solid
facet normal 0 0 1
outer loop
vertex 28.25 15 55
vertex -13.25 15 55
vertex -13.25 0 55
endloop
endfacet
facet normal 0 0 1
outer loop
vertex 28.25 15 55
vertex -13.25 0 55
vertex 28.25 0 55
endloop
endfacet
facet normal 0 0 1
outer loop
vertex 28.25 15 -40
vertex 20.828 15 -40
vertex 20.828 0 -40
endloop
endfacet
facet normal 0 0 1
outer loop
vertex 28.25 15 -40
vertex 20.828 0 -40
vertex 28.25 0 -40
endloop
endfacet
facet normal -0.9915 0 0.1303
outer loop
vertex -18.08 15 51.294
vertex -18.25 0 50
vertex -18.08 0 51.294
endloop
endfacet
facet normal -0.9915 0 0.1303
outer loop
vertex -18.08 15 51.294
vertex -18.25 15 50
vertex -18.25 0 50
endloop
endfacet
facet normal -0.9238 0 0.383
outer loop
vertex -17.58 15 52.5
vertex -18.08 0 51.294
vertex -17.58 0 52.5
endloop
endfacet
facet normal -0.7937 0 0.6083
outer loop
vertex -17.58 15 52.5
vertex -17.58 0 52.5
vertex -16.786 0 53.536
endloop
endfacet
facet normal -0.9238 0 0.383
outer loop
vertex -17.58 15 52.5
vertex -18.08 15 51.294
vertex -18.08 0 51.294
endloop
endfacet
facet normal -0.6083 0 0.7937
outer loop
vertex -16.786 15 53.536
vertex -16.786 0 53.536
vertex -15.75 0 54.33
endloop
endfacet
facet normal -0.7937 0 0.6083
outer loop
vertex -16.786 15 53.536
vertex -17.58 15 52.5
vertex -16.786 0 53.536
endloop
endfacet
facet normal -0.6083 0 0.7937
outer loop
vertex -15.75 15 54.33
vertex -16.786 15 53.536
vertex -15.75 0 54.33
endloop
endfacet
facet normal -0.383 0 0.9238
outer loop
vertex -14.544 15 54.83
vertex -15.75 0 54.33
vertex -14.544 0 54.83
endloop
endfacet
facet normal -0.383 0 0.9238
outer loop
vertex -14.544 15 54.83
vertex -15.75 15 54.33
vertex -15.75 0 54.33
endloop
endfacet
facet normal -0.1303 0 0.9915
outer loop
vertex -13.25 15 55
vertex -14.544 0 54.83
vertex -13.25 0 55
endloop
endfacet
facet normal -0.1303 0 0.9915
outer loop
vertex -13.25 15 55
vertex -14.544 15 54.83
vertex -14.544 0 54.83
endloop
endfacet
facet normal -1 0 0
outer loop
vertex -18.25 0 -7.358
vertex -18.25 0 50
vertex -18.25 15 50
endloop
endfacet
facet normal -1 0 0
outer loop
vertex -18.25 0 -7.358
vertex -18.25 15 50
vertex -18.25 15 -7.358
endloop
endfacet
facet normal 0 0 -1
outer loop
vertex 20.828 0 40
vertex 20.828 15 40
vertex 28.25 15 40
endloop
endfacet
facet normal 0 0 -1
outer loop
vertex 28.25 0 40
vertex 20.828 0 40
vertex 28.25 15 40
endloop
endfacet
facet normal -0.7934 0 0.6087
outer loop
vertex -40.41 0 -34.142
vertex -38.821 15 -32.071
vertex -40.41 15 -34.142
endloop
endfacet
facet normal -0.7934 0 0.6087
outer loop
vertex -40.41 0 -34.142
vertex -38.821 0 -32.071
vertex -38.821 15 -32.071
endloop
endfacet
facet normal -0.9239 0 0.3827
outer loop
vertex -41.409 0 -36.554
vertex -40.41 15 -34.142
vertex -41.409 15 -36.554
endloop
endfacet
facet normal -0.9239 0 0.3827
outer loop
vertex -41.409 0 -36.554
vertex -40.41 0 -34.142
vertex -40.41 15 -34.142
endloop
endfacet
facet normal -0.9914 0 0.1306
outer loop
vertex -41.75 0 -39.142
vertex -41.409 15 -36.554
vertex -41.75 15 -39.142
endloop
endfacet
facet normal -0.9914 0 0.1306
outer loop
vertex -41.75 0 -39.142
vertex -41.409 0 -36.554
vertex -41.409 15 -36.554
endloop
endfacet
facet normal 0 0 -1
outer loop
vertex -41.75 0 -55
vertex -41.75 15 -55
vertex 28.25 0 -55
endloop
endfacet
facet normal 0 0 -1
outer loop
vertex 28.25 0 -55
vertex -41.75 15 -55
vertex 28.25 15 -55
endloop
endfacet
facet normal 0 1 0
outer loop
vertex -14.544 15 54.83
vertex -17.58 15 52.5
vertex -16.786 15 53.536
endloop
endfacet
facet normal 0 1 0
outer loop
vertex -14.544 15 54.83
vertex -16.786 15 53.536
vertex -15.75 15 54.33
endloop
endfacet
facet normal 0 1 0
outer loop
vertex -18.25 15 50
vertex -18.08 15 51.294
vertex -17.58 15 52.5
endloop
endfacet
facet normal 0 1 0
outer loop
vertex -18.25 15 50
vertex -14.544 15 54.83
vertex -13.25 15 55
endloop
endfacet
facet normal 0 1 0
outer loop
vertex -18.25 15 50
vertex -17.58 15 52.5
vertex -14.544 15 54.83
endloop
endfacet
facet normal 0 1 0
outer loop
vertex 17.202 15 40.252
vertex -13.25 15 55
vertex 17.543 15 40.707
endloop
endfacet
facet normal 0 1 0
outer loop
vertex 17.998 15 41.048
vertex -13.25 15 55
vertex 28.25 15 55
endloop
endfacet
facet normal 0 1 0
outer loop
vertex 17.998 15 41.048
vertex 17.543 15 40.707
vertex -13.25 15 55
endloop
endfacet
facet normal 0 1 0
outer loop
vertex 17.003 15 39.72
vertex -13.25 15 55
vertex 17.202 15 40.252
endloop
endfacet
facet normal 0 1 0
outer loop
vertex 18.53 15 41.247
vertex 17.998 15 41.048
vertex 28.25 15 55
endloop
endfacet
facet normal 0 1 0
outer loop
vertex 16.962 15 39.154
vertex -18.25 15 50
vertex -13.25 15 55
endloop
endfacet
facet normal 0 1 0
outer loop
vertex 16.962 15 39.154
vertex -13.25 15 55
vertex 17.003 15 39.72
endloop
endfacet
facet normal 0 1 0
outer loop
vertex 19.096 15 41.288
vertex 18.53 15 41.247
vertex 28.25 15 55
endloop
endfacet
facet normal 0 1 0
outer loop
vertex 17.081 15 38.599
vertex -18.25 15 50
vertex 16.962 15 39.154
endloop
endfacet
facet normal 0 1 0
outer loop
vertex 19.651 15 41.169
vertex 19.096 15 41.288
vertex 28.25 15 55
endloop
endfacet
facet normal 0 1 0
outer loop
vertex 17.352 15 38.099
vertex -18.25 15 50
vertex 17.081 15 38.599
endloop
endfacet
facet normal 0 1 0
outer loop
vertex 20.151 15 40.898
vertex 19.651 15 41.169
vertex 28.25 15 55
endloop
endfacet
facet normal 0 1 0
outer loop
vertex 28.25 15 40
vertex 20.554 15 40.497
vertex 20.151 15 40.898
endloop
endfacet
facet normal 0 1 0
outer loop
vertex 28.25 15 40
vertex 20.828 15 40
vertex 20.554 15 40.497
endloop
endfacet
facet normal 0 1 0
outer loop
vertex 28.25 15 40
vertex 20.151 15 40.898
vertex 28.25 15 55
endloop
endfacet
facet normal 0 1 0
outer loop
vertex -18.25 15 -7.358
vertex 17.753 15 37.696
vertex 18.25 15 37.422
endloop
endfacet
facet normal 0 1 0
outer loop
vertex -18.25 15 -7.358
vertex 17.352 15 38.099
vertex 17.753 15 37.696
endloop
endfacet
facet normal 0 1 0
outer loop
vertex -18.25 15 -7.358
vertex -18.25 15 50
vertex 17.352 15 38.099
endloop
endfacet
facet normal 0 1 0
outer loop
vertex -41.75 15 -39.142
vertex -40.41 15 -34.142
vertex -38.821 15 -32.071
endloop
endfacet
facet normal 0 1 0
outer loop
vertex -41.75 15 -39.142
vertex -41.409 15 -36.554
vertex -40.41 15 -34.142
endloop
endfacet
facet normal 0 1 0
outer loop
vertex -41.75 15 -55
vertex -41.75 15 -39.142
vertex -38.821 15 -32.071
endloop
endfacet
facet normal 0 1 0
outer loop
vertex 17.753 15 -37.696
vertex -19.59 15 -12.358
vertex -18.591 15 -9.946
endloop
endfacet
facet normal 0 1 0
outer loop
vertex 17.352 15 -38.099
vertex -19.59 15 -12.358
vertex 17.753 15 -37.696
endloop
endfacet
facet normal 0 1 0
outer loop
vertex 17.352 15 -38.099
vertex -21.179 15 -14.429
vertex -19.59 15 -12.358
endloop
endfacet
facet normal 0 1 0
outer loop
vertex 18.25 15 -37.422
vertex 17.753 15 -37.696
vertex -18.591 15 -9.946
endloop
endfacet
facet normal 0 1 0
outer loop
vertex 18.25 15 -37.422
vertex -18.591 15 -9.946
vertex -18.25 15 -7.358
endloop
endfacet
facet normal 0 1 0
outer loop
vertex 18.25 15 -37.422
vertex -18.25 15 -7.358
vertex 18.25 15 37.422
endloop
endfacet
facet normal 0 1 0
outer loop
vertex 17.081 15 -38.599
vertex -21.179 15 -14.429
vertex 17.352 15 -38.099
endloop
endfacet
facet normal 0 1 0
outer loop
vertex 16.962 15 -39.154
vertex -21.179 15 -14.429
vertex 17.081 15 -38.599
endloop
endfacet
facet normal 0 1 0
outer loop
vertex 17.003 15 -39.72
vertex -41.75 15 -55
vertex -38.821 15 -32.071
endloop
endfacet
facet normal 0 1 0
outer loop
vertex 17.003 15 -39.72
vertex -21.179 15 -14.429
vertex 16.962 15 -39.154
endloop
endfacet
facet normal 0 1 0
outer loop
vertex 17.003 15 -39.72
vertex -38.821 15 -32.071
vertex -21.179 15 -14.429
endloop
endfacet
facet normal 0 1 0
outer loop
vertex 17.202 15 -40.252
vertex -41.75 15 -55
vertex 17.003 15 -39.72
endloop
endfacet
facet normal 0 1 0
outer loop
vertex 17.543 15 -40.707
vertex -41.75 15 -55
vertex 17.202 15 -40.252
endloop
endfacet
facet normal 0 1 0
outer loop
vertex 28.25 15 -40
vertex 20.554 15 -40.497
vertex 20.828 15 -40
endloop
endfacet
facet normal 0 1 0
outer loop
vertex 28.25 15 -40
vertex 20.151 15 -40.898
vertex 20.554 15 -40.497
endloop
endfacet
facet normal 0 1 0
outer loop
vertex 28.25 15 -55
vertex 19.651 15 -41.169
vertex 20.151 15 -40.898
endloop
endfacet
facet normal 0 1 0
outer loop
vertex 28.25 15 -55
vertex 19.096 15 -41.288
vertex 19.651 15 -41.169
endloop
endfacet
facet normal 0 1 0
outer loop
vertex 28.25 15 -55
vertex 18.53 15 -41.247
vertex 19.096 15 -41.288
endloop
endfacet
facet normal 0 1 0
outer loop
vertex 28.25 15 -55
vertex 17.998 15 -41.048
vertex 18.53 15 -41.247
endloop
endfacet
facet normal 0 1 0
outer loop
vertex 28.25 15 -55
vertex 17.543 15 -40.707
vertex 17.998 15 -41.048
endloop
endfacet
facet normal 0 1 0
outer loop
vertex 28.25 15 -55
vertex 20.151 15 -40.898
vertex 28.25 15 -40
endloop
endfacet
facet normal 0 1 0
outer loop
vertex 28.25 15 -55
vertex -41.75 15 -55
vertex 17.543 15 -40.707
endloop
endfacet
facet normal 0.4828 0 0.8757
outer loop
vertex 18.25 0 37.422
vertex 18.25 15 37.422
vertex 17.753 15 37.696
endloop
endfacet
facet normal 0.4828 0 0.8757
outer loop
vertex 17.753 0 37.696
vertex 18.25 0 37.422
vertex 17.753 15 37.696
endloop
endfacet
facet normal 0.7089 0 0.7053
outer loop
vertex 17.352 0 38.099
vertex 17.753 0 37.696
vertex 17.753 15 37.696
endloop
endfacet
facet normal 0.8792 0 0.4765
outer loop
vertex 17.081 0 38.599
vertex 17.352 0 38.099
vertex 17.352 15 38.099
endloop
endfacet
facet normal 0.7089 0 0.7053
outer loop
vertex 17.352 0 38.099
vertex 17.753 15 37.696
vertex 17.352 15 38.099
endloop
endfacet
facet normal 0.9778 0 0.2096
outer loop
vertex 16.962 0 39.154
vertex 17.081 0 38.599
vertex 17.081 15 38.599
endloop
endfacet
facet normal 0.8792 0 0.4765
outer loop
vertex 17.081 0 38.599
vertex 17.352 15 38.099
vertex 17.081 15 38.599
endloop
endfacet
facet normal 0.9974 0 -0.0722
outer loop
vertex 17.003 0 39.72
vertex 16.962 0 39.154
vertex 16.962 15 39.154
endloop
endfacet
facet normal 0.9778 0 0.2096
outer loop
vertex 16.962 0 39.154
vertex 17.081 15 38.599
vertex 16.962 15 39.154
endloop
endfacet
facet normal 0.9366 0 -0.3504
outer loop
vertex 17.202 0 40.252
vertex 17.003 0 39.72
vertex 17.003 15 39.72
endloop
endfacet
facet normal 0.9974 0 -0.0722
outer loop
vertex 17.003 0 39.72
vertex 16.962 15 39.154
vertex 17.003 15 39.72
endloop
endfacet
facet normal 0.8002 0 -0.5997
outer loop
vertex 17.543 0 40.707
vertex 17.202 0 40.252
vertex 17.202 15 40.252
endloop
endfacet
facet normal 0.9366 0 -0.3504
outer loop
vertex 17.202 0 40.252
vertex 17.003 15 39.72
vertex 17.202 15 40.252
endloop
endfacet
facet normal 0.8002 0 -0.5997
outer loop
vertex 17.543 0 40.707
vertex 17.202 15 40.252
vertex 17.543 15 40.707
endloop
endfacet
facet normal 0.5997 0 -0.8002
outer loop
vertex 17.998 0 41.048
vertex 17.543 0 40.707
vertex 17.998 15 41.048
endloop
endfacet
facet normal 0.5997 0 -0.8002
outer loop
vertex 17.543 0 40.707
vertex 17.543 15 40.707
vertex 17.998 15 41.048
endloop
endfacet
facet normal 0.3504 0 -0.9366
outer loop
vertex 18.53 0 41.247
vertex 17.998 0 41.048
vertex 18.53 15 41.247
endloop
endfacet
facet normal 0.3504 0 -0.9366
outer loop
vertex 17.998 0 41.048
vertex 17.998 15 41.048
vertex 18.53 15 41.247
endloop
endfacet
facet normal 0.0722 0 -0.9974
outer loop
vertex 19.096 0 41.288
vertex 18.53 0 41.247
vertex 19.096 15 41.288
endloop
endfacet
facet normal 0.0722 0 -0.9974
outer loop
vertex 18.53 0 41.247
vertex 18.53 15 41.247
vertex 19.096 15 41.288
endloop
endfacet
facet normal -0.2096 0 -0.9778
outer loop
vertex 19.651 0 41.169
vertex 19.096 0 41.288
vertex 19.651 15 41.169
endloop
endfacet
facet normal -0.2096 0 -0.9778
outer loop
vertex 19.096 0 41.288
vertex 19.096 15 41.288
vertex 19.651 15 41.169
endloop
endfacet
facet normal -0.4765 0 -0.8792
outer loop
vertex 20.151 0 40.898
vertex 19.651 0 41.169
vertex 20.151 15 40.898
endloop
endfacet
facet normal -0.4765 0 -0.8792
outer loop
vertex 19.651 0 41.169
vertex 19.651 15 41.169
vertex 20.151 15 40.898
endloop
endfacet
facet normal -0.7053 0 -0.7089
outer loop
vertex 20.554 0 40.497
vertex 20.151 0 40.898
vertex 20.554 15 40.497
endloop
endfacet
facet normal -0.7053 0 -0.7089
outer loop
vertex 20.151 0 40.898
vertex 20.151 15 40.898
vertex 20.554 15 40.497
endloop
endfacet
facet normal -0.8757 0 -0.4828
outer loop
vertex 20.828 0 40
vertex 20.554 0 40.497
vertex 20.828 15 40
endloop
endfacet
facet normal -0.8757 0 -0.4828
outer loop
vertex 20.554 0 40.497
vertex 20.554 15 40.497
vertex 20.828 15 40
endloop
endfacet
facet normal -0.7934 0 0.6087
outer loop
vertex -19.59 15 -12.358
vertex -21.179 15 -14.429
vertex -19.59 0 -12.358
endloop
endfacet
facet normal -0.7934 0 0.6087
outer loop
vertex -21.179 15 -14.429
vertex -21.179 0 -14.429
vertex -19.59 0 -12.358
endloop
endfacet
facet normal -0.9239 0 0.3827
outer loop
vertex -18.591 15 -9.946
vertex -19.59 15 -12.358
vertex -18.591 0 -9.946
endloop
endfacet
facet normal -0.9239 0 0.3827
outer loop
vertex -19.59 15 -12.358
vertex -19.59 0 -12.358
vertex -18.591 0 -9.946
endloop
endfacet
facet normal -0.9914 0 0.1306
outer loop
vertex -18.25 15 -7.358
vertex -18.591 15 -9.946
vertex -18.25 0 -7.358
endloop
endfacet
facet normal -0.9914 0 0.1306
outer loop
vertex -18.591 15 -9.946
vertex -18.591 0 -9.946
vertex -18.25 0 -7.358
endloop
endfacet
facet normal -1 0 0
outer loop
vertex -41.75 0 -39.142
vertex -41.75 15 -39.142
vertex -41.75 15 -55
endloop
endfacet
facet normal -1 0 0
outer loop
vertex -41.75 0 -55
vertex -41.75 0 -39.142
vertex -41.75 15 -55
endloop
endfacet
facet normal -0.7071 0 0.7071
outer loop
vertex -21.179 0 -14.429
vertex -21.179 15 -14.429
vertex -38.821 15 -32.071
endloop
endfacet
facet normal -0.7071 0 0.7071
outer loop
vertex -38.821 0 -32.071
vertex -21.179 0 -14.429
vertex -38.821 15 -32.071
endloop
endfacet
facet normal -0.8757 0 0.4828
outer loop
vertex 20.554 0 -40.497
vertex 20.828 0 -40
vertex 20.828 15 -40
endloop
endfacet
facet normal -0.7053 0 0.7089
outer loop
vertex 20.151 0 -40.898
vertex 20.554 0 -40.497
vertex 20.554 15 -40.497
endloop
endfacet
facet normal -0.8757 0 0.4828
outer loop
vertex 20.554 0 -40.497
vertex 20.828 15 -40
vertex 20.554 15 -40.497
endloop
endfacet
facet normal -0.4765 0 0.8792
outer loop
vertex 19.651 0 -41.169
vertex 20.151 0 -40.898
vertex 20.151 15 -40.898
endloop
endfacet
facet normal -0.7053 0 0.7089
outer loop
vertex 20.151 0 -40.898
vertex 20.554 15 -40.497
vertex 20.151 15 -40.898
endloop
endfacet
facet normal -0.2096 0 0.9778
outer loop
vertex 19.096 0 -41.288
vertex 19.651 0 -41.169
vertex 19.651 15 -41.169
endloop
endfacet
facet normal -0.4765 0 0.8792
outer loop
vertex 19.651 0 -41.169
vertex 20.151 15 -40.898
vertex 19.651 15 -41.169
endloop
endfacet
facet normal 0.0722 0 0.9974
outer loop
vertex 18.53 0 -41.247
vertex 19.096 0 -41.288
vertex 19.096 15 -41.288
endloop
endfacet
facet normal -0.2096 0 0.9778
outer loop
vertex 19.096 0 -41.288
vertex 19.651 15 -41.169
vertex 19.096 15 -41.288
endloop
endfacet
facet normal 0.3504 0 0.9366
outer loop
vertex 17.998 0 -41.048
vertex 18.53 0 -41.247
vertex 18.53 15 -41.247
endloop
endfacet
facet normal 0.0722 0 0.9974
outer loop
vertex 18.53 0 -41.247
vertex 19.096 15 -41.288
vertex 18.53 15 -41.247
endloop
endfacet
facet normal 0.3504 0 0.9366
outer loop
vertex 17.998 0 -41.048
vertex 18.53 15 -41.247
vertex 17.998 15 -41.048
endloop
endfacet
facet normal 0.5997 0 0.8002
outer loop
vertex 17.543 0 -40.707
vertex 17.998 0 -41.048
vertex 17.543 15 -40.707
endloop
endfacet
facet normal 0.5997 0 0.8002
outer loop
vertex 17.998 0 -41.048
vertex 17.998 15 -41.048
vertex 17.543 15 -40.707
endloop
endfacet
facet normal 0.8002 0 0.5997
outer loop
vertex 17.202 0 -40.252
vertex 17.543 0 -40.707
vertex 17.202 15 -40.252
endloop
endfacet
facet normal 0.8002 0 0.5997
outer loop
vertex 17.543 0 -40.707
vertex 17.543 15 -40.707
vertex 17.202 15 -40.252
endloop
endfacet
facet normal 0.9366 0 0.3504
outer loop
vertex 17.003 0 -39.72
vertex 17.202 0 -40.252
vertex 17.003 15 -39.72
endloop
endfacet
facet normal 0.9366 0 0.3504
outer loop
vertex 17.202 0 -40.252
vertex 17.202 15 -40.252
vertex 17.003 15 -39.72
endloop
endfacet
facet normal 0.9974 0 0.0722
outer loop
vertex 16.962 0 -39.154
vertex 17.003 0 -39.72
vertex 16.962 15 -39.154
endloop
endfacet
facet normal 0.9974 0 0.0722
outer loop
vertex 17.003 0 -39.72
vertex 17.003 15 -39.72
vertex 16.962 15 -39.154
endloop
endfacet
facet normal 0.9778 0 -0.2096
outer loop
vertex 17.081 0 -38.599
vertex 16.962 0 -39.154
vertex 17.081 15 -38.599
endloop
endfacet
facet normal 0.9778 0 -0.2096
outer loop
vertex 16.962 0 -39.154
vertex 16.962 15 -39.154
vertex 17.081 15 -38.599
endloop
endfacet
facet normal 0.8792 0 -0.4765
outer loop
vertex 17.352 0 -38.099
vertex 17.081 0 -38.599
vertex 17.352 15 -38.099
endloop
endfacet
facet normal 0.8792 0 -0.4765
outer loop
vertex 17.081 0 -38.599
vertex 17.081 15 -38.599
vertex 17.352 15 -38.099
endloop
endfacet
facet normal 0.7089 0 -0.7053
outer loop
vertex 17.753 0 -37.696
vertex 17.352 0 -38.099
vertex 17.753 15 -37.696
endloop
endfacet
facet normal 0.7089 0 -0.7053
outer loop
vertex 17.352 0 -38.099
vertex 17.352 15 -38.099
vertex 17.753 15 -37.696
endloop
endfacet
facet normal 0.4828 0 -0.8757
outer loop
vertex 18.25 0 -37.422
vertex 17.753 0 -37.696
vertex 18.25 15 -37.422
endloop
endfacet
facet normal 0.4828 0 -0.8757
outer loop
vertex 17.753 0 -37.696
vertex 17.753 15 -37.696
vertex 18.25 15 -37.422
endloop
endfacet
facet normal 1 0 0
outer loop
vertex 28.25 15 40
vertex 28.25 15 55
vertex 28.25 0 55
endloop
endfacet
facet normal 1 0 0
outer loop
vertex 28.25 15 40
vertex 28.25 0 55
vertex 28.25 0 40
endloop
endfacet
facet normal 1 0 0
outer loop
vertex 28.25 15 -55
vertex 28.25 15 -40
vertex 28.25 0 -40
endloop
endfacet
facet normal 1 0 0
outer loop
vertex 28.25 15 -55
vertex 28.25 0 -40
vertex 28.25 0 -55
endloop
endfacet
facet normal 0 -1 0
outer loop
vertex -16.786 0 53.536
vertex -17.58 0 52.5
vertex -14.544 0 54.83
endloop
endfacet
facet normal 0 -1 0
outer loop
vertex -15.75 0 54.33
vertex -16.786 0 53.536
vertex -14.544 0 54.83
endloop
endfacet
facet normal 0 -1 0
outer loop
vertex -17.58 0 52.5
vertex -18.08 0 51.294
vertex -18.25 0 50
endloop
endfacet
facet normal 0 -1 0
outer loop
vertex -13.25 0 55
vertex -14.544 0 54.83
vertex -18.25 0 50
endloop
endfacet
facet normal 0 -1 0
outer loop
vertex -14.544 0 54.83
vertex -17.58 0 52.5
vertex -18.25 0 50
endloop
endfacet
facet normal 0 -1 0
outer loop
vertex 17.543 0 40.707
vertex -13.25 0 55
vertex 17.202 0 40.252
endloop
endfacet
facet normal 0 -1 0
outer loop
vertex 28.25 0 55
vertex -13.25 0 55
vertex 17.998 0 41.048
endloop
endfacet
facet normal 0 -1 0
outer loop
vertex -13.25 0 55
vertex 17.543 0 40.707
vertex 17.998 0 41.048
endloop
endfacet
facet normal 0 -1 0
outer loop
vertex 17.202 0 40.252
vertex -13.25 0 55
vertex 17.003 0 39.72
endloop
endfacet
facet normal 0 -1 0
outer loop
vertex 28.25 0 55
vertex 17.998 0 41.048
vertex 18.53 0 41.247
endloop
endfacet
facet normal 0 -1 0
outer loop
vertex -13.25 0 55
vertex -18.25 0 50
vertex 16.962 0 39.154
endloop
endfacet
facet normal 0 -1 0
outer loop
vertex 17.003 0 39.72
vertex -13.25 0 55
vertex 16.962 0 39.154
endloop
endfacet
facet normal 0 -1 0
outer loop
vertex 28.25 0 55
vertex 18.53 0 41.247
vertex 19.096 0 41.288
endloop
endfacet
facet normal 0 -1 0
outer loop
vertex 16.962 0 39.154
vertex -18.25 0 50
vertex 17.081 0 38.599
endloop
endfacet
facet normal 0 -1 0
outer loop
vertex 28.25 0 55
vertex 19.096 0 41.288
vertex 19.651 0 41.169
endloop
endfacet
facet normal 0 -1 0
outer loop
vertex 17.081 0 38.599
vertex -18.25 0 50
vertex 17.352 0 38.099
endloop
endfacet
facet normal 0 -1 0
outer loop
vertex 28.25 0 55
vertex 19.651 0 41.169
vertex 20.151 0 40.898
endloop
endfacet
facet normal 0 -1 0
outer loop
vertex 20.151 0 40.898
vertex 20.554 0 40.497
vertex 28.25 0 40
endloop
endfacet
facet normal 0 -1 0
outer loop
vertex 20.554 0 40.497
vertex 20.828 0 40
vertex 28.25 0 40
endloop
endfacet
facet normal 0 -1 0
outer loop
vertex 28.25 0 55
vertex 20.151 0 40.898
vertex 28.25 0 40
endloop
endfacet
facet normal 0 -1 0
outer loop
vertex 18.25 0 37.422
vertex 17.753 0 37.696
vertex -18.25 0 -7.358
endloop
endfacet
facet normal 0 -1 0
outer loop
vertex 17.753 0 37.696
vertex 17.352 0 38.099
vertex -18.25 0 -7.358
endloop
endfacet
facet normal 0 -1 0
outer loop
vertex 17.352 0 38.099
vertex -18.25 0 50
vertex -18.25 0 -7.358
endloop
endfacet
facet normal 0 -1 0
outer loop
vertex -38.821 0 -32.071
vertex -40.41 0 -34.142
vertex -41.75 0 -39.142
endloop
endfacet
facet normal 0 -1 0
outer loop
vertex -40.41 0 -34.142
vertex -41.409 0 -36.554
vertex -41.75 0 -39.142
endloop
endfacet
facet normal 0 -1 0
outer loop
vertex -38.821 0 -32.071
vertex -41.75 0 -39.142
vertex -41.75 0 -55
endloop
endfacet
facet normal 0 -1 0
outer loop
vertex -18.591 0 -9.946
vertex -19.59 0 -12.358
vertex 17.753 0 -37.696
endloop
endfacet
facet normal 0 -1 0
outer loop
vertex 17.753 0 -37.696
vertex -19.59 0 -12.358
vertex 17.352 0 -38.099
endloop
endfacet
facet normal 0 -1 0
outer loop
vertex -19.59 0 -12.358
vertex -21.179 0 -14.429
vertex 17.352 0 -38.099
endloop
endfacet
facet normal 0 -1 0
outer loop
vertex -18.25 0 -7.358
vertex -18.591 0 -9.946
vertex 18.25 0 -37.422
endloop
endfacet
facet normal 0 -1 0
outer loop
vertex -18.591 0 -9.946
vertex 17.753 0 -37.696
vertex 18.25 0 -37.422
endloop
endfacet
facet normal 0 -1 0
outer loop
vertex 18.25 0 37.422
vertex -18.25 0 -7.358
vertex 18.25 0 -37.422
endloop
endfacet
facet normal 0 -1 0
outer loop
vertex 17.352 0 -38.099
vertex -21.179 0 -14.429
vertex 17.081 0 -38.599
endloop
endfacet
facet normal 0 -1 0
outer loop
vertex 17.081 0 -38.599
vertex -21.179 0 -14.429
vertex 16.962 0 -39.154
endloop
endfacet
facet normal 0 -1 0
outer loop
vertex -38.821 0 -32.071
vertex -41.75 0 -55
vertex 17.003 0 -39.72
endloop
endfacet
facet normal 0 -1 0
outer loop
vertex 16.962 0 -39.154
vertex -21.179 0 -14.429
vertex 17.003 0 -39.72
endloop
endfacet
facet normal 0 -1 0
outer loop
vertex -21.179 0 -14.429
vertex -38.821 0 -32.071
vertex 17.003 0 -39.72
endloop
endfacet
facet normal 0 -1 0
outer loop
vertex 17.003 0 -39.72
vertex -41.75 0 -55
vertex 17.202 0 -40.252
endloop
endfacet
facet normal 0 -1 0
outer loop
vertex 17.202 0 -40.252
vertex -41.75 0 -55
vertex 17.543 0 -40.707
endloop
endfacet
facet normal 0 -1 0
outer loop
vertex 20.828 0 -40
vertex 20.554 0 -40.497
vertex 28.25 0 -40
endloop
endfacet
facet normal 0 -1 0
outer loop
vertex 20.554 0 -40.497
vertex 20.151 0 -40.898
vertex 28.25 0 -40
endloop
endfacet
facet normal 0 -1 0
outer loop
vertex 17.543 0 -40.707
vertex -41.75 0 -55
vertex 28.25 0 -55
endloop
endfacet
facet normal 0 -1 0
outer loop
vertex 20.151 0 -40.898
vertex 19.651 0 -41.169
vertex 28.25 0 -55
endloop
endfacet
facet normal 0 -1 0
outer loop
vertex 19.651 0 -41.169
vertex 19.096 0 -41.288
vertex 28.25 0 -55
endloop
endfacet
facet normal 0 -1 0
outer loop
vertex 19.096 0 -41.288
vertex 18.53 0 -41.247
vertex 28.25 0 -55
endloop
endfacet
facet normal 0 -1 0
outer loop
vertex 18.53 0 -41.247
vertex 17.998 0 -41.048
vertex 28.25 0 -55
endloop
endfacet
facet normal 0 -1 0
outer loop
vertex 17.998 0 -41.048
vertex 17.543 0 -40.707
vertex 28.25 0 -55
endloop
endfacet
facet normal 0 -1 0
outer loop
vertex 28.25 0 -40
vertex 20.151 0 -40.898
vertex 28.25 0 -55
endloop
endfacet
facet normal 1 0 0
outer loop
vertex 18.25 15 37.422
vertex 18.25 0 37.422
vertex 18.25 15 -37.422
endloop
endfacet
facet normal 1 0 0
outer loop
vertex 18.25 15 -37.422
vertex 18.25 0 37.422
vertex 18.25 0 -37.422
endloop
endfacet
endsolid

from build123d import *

# Parameters (mm, degrees)
SKETCH1_W           = 36.5
SKETCH1_H           = 110
BOSS_EXTRUDE1_DEPTH = 15
BOSS_EXTRUDE2_DEPTH = 15
FILLET1_R           = 10
FILLET2_R           = 5
SKETCH3_W           = 10
SKETCH3_H           = 15
BOSS_EXTRUDE3_DEPTH = 15
SKETCH4_R           = 2
CUT_EXTRUDE1_DEPTH  = 71.661605558


with BuildPart() as part:
    # Sketch1 → Boss-Extrude1 (new body)
    with BuildSketch(Plane(origin=(0, 0, 0), x_dir=(1, 0, 0), z_dir=(0, 1, 0))):
        Rectangle(SKETCH1_W, SKETCH1_H)
    extrude(amount=BOSS_EXTRUDE1_DEPTH)

    # Sketch2 → Boss-Extrude2 (add)
    with BuildSketch(Plane(origin=(0, 15, 0), x_dir=(1, 0, 0), z_dir=(0, 1, 0))):
        Polygon((-18.25, 11.5), (-41.75, 35), (-41.75, 55), (-18.25, 55), align=None)
    extrude(amount=-BOSS_EXTRUDE2_DEPTH)

    # Fillet1
    fillet1_edges = [part.edges().sort_by_distance(p)[0] for p in [
        (-18.25, 7.5, -11.5),
        (-41.75, 7.5, -35),
    ]]
    fillet(fillet1_edges, radius=FILLET1_R)

    # Fillet2
    fillet2_edges = [part.edges().sort_by_distance(p)[0] for p in [
        (-18.25, 7.5, 55),
    ]]
    fillet(fillet2_edges, radius=FILLET2_R)

    # Sketch3 → Boss-Extrude3 (add)
    with BuildSketch(Plane(origin=(0, 15, 0), x_dir=(1, 0, 0), z_dir=(0, 1, 0))):
        with Locations((23.25, -47.5)):
            Rectangle(SKETCH3_W, SKETCH3_H)
        with Locations((23.25, 47.5)):
            Rectangle(SKETCH3_W, SKETCH3_H)
    extrude(amount=-BOSS_EXTRUDE3_DEPTH)

    # Sketch4 → Cut-Extrude1 (cut, through all)
    with BuildSketch(Plane(origin=(0, 15, 0), x_dir=(1, 0, 0), z_dir=(0, 1, 0))):
        with Locations((18.957106781, 39.292893219)):
            Circle(SKETCH4_R)
        with Locations((18.957106781, -39.292893219)):
            Circle(SKETCH4_R)
    extrude(amount=-CUT_EXTRUDE1_DEPTH, mode=Mode.SUBTRACT)


solid = part.part
